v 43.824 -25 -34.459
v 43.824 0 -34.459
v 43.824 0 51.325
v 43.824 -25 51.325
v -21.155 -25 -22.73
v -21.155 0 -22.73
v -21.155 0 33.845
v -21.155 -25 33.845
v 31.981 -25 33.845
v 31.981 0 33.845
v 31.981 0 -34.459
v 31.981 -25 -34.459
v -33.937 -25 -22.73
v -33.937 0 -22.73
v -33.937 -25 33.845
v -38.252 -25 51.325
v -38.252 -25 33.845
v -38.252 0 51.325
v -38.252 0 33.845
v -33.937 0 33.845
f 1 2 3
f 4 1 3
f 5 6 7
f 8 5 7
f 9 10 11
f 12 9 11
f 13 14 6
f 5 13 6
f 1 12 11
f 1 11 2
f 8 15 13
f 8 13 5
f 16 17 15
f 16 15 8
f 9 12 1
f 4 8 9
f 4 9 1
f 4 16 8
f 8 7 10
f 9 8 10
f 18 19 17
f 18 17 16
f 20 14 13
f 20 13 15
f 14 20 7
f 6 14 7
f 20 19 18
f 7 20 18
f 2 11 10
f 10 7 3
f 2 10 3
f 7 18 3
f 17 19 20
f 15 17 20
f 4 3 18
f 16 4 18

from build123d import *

# Parameters (mm, degrees)
F0_W     = 70.2332556248
F0_H     = 17.4792334437
F0_W_2   = 11.8431299925
F1_DEPTH = 25
F0_H_2   = 68.3041326702
F2_DEPTH = 25
F3_W     = 12.7824991941
F3_H     = 73.9819798619
F4_DEPTH = 25


with BuildPart() as f1:
    # F0 (on Front) → F1 (new body)
    with BuildSketch(Plane.XZ):
        with Locations((-3.1356401742, 42.5850078464)):
            Rectangle(F0_W, F0_H)
        with Locations((37.9025526345, 42.5850078464)):
            Rectangle(F0_W_2, F0_H)
    extrude(amount=F1_DEPTH)

    # F0 (on Front) → F2 (join)
    with BuildSketch(Plane.XZ):
        with Locations((37.9025526345, -0.3066752106)):
            Rectangle(F0_W_2, F0_H_2)
        with Locations((37.9025526345, 42.5850078464)):
            Rectangle(F0_W_2, F0_H)
    extrude(amount=F2_DEPTH)

    # F3 (on Front) → F4 (join)
    with BuildSketch(Plane.XZ):
        with Locations((-27.5457836688, 14.2613416538)):
            Rectangle(F3_W, F3_H)
    extrude(amount=F4_DEPTH)


solid = f1.part
